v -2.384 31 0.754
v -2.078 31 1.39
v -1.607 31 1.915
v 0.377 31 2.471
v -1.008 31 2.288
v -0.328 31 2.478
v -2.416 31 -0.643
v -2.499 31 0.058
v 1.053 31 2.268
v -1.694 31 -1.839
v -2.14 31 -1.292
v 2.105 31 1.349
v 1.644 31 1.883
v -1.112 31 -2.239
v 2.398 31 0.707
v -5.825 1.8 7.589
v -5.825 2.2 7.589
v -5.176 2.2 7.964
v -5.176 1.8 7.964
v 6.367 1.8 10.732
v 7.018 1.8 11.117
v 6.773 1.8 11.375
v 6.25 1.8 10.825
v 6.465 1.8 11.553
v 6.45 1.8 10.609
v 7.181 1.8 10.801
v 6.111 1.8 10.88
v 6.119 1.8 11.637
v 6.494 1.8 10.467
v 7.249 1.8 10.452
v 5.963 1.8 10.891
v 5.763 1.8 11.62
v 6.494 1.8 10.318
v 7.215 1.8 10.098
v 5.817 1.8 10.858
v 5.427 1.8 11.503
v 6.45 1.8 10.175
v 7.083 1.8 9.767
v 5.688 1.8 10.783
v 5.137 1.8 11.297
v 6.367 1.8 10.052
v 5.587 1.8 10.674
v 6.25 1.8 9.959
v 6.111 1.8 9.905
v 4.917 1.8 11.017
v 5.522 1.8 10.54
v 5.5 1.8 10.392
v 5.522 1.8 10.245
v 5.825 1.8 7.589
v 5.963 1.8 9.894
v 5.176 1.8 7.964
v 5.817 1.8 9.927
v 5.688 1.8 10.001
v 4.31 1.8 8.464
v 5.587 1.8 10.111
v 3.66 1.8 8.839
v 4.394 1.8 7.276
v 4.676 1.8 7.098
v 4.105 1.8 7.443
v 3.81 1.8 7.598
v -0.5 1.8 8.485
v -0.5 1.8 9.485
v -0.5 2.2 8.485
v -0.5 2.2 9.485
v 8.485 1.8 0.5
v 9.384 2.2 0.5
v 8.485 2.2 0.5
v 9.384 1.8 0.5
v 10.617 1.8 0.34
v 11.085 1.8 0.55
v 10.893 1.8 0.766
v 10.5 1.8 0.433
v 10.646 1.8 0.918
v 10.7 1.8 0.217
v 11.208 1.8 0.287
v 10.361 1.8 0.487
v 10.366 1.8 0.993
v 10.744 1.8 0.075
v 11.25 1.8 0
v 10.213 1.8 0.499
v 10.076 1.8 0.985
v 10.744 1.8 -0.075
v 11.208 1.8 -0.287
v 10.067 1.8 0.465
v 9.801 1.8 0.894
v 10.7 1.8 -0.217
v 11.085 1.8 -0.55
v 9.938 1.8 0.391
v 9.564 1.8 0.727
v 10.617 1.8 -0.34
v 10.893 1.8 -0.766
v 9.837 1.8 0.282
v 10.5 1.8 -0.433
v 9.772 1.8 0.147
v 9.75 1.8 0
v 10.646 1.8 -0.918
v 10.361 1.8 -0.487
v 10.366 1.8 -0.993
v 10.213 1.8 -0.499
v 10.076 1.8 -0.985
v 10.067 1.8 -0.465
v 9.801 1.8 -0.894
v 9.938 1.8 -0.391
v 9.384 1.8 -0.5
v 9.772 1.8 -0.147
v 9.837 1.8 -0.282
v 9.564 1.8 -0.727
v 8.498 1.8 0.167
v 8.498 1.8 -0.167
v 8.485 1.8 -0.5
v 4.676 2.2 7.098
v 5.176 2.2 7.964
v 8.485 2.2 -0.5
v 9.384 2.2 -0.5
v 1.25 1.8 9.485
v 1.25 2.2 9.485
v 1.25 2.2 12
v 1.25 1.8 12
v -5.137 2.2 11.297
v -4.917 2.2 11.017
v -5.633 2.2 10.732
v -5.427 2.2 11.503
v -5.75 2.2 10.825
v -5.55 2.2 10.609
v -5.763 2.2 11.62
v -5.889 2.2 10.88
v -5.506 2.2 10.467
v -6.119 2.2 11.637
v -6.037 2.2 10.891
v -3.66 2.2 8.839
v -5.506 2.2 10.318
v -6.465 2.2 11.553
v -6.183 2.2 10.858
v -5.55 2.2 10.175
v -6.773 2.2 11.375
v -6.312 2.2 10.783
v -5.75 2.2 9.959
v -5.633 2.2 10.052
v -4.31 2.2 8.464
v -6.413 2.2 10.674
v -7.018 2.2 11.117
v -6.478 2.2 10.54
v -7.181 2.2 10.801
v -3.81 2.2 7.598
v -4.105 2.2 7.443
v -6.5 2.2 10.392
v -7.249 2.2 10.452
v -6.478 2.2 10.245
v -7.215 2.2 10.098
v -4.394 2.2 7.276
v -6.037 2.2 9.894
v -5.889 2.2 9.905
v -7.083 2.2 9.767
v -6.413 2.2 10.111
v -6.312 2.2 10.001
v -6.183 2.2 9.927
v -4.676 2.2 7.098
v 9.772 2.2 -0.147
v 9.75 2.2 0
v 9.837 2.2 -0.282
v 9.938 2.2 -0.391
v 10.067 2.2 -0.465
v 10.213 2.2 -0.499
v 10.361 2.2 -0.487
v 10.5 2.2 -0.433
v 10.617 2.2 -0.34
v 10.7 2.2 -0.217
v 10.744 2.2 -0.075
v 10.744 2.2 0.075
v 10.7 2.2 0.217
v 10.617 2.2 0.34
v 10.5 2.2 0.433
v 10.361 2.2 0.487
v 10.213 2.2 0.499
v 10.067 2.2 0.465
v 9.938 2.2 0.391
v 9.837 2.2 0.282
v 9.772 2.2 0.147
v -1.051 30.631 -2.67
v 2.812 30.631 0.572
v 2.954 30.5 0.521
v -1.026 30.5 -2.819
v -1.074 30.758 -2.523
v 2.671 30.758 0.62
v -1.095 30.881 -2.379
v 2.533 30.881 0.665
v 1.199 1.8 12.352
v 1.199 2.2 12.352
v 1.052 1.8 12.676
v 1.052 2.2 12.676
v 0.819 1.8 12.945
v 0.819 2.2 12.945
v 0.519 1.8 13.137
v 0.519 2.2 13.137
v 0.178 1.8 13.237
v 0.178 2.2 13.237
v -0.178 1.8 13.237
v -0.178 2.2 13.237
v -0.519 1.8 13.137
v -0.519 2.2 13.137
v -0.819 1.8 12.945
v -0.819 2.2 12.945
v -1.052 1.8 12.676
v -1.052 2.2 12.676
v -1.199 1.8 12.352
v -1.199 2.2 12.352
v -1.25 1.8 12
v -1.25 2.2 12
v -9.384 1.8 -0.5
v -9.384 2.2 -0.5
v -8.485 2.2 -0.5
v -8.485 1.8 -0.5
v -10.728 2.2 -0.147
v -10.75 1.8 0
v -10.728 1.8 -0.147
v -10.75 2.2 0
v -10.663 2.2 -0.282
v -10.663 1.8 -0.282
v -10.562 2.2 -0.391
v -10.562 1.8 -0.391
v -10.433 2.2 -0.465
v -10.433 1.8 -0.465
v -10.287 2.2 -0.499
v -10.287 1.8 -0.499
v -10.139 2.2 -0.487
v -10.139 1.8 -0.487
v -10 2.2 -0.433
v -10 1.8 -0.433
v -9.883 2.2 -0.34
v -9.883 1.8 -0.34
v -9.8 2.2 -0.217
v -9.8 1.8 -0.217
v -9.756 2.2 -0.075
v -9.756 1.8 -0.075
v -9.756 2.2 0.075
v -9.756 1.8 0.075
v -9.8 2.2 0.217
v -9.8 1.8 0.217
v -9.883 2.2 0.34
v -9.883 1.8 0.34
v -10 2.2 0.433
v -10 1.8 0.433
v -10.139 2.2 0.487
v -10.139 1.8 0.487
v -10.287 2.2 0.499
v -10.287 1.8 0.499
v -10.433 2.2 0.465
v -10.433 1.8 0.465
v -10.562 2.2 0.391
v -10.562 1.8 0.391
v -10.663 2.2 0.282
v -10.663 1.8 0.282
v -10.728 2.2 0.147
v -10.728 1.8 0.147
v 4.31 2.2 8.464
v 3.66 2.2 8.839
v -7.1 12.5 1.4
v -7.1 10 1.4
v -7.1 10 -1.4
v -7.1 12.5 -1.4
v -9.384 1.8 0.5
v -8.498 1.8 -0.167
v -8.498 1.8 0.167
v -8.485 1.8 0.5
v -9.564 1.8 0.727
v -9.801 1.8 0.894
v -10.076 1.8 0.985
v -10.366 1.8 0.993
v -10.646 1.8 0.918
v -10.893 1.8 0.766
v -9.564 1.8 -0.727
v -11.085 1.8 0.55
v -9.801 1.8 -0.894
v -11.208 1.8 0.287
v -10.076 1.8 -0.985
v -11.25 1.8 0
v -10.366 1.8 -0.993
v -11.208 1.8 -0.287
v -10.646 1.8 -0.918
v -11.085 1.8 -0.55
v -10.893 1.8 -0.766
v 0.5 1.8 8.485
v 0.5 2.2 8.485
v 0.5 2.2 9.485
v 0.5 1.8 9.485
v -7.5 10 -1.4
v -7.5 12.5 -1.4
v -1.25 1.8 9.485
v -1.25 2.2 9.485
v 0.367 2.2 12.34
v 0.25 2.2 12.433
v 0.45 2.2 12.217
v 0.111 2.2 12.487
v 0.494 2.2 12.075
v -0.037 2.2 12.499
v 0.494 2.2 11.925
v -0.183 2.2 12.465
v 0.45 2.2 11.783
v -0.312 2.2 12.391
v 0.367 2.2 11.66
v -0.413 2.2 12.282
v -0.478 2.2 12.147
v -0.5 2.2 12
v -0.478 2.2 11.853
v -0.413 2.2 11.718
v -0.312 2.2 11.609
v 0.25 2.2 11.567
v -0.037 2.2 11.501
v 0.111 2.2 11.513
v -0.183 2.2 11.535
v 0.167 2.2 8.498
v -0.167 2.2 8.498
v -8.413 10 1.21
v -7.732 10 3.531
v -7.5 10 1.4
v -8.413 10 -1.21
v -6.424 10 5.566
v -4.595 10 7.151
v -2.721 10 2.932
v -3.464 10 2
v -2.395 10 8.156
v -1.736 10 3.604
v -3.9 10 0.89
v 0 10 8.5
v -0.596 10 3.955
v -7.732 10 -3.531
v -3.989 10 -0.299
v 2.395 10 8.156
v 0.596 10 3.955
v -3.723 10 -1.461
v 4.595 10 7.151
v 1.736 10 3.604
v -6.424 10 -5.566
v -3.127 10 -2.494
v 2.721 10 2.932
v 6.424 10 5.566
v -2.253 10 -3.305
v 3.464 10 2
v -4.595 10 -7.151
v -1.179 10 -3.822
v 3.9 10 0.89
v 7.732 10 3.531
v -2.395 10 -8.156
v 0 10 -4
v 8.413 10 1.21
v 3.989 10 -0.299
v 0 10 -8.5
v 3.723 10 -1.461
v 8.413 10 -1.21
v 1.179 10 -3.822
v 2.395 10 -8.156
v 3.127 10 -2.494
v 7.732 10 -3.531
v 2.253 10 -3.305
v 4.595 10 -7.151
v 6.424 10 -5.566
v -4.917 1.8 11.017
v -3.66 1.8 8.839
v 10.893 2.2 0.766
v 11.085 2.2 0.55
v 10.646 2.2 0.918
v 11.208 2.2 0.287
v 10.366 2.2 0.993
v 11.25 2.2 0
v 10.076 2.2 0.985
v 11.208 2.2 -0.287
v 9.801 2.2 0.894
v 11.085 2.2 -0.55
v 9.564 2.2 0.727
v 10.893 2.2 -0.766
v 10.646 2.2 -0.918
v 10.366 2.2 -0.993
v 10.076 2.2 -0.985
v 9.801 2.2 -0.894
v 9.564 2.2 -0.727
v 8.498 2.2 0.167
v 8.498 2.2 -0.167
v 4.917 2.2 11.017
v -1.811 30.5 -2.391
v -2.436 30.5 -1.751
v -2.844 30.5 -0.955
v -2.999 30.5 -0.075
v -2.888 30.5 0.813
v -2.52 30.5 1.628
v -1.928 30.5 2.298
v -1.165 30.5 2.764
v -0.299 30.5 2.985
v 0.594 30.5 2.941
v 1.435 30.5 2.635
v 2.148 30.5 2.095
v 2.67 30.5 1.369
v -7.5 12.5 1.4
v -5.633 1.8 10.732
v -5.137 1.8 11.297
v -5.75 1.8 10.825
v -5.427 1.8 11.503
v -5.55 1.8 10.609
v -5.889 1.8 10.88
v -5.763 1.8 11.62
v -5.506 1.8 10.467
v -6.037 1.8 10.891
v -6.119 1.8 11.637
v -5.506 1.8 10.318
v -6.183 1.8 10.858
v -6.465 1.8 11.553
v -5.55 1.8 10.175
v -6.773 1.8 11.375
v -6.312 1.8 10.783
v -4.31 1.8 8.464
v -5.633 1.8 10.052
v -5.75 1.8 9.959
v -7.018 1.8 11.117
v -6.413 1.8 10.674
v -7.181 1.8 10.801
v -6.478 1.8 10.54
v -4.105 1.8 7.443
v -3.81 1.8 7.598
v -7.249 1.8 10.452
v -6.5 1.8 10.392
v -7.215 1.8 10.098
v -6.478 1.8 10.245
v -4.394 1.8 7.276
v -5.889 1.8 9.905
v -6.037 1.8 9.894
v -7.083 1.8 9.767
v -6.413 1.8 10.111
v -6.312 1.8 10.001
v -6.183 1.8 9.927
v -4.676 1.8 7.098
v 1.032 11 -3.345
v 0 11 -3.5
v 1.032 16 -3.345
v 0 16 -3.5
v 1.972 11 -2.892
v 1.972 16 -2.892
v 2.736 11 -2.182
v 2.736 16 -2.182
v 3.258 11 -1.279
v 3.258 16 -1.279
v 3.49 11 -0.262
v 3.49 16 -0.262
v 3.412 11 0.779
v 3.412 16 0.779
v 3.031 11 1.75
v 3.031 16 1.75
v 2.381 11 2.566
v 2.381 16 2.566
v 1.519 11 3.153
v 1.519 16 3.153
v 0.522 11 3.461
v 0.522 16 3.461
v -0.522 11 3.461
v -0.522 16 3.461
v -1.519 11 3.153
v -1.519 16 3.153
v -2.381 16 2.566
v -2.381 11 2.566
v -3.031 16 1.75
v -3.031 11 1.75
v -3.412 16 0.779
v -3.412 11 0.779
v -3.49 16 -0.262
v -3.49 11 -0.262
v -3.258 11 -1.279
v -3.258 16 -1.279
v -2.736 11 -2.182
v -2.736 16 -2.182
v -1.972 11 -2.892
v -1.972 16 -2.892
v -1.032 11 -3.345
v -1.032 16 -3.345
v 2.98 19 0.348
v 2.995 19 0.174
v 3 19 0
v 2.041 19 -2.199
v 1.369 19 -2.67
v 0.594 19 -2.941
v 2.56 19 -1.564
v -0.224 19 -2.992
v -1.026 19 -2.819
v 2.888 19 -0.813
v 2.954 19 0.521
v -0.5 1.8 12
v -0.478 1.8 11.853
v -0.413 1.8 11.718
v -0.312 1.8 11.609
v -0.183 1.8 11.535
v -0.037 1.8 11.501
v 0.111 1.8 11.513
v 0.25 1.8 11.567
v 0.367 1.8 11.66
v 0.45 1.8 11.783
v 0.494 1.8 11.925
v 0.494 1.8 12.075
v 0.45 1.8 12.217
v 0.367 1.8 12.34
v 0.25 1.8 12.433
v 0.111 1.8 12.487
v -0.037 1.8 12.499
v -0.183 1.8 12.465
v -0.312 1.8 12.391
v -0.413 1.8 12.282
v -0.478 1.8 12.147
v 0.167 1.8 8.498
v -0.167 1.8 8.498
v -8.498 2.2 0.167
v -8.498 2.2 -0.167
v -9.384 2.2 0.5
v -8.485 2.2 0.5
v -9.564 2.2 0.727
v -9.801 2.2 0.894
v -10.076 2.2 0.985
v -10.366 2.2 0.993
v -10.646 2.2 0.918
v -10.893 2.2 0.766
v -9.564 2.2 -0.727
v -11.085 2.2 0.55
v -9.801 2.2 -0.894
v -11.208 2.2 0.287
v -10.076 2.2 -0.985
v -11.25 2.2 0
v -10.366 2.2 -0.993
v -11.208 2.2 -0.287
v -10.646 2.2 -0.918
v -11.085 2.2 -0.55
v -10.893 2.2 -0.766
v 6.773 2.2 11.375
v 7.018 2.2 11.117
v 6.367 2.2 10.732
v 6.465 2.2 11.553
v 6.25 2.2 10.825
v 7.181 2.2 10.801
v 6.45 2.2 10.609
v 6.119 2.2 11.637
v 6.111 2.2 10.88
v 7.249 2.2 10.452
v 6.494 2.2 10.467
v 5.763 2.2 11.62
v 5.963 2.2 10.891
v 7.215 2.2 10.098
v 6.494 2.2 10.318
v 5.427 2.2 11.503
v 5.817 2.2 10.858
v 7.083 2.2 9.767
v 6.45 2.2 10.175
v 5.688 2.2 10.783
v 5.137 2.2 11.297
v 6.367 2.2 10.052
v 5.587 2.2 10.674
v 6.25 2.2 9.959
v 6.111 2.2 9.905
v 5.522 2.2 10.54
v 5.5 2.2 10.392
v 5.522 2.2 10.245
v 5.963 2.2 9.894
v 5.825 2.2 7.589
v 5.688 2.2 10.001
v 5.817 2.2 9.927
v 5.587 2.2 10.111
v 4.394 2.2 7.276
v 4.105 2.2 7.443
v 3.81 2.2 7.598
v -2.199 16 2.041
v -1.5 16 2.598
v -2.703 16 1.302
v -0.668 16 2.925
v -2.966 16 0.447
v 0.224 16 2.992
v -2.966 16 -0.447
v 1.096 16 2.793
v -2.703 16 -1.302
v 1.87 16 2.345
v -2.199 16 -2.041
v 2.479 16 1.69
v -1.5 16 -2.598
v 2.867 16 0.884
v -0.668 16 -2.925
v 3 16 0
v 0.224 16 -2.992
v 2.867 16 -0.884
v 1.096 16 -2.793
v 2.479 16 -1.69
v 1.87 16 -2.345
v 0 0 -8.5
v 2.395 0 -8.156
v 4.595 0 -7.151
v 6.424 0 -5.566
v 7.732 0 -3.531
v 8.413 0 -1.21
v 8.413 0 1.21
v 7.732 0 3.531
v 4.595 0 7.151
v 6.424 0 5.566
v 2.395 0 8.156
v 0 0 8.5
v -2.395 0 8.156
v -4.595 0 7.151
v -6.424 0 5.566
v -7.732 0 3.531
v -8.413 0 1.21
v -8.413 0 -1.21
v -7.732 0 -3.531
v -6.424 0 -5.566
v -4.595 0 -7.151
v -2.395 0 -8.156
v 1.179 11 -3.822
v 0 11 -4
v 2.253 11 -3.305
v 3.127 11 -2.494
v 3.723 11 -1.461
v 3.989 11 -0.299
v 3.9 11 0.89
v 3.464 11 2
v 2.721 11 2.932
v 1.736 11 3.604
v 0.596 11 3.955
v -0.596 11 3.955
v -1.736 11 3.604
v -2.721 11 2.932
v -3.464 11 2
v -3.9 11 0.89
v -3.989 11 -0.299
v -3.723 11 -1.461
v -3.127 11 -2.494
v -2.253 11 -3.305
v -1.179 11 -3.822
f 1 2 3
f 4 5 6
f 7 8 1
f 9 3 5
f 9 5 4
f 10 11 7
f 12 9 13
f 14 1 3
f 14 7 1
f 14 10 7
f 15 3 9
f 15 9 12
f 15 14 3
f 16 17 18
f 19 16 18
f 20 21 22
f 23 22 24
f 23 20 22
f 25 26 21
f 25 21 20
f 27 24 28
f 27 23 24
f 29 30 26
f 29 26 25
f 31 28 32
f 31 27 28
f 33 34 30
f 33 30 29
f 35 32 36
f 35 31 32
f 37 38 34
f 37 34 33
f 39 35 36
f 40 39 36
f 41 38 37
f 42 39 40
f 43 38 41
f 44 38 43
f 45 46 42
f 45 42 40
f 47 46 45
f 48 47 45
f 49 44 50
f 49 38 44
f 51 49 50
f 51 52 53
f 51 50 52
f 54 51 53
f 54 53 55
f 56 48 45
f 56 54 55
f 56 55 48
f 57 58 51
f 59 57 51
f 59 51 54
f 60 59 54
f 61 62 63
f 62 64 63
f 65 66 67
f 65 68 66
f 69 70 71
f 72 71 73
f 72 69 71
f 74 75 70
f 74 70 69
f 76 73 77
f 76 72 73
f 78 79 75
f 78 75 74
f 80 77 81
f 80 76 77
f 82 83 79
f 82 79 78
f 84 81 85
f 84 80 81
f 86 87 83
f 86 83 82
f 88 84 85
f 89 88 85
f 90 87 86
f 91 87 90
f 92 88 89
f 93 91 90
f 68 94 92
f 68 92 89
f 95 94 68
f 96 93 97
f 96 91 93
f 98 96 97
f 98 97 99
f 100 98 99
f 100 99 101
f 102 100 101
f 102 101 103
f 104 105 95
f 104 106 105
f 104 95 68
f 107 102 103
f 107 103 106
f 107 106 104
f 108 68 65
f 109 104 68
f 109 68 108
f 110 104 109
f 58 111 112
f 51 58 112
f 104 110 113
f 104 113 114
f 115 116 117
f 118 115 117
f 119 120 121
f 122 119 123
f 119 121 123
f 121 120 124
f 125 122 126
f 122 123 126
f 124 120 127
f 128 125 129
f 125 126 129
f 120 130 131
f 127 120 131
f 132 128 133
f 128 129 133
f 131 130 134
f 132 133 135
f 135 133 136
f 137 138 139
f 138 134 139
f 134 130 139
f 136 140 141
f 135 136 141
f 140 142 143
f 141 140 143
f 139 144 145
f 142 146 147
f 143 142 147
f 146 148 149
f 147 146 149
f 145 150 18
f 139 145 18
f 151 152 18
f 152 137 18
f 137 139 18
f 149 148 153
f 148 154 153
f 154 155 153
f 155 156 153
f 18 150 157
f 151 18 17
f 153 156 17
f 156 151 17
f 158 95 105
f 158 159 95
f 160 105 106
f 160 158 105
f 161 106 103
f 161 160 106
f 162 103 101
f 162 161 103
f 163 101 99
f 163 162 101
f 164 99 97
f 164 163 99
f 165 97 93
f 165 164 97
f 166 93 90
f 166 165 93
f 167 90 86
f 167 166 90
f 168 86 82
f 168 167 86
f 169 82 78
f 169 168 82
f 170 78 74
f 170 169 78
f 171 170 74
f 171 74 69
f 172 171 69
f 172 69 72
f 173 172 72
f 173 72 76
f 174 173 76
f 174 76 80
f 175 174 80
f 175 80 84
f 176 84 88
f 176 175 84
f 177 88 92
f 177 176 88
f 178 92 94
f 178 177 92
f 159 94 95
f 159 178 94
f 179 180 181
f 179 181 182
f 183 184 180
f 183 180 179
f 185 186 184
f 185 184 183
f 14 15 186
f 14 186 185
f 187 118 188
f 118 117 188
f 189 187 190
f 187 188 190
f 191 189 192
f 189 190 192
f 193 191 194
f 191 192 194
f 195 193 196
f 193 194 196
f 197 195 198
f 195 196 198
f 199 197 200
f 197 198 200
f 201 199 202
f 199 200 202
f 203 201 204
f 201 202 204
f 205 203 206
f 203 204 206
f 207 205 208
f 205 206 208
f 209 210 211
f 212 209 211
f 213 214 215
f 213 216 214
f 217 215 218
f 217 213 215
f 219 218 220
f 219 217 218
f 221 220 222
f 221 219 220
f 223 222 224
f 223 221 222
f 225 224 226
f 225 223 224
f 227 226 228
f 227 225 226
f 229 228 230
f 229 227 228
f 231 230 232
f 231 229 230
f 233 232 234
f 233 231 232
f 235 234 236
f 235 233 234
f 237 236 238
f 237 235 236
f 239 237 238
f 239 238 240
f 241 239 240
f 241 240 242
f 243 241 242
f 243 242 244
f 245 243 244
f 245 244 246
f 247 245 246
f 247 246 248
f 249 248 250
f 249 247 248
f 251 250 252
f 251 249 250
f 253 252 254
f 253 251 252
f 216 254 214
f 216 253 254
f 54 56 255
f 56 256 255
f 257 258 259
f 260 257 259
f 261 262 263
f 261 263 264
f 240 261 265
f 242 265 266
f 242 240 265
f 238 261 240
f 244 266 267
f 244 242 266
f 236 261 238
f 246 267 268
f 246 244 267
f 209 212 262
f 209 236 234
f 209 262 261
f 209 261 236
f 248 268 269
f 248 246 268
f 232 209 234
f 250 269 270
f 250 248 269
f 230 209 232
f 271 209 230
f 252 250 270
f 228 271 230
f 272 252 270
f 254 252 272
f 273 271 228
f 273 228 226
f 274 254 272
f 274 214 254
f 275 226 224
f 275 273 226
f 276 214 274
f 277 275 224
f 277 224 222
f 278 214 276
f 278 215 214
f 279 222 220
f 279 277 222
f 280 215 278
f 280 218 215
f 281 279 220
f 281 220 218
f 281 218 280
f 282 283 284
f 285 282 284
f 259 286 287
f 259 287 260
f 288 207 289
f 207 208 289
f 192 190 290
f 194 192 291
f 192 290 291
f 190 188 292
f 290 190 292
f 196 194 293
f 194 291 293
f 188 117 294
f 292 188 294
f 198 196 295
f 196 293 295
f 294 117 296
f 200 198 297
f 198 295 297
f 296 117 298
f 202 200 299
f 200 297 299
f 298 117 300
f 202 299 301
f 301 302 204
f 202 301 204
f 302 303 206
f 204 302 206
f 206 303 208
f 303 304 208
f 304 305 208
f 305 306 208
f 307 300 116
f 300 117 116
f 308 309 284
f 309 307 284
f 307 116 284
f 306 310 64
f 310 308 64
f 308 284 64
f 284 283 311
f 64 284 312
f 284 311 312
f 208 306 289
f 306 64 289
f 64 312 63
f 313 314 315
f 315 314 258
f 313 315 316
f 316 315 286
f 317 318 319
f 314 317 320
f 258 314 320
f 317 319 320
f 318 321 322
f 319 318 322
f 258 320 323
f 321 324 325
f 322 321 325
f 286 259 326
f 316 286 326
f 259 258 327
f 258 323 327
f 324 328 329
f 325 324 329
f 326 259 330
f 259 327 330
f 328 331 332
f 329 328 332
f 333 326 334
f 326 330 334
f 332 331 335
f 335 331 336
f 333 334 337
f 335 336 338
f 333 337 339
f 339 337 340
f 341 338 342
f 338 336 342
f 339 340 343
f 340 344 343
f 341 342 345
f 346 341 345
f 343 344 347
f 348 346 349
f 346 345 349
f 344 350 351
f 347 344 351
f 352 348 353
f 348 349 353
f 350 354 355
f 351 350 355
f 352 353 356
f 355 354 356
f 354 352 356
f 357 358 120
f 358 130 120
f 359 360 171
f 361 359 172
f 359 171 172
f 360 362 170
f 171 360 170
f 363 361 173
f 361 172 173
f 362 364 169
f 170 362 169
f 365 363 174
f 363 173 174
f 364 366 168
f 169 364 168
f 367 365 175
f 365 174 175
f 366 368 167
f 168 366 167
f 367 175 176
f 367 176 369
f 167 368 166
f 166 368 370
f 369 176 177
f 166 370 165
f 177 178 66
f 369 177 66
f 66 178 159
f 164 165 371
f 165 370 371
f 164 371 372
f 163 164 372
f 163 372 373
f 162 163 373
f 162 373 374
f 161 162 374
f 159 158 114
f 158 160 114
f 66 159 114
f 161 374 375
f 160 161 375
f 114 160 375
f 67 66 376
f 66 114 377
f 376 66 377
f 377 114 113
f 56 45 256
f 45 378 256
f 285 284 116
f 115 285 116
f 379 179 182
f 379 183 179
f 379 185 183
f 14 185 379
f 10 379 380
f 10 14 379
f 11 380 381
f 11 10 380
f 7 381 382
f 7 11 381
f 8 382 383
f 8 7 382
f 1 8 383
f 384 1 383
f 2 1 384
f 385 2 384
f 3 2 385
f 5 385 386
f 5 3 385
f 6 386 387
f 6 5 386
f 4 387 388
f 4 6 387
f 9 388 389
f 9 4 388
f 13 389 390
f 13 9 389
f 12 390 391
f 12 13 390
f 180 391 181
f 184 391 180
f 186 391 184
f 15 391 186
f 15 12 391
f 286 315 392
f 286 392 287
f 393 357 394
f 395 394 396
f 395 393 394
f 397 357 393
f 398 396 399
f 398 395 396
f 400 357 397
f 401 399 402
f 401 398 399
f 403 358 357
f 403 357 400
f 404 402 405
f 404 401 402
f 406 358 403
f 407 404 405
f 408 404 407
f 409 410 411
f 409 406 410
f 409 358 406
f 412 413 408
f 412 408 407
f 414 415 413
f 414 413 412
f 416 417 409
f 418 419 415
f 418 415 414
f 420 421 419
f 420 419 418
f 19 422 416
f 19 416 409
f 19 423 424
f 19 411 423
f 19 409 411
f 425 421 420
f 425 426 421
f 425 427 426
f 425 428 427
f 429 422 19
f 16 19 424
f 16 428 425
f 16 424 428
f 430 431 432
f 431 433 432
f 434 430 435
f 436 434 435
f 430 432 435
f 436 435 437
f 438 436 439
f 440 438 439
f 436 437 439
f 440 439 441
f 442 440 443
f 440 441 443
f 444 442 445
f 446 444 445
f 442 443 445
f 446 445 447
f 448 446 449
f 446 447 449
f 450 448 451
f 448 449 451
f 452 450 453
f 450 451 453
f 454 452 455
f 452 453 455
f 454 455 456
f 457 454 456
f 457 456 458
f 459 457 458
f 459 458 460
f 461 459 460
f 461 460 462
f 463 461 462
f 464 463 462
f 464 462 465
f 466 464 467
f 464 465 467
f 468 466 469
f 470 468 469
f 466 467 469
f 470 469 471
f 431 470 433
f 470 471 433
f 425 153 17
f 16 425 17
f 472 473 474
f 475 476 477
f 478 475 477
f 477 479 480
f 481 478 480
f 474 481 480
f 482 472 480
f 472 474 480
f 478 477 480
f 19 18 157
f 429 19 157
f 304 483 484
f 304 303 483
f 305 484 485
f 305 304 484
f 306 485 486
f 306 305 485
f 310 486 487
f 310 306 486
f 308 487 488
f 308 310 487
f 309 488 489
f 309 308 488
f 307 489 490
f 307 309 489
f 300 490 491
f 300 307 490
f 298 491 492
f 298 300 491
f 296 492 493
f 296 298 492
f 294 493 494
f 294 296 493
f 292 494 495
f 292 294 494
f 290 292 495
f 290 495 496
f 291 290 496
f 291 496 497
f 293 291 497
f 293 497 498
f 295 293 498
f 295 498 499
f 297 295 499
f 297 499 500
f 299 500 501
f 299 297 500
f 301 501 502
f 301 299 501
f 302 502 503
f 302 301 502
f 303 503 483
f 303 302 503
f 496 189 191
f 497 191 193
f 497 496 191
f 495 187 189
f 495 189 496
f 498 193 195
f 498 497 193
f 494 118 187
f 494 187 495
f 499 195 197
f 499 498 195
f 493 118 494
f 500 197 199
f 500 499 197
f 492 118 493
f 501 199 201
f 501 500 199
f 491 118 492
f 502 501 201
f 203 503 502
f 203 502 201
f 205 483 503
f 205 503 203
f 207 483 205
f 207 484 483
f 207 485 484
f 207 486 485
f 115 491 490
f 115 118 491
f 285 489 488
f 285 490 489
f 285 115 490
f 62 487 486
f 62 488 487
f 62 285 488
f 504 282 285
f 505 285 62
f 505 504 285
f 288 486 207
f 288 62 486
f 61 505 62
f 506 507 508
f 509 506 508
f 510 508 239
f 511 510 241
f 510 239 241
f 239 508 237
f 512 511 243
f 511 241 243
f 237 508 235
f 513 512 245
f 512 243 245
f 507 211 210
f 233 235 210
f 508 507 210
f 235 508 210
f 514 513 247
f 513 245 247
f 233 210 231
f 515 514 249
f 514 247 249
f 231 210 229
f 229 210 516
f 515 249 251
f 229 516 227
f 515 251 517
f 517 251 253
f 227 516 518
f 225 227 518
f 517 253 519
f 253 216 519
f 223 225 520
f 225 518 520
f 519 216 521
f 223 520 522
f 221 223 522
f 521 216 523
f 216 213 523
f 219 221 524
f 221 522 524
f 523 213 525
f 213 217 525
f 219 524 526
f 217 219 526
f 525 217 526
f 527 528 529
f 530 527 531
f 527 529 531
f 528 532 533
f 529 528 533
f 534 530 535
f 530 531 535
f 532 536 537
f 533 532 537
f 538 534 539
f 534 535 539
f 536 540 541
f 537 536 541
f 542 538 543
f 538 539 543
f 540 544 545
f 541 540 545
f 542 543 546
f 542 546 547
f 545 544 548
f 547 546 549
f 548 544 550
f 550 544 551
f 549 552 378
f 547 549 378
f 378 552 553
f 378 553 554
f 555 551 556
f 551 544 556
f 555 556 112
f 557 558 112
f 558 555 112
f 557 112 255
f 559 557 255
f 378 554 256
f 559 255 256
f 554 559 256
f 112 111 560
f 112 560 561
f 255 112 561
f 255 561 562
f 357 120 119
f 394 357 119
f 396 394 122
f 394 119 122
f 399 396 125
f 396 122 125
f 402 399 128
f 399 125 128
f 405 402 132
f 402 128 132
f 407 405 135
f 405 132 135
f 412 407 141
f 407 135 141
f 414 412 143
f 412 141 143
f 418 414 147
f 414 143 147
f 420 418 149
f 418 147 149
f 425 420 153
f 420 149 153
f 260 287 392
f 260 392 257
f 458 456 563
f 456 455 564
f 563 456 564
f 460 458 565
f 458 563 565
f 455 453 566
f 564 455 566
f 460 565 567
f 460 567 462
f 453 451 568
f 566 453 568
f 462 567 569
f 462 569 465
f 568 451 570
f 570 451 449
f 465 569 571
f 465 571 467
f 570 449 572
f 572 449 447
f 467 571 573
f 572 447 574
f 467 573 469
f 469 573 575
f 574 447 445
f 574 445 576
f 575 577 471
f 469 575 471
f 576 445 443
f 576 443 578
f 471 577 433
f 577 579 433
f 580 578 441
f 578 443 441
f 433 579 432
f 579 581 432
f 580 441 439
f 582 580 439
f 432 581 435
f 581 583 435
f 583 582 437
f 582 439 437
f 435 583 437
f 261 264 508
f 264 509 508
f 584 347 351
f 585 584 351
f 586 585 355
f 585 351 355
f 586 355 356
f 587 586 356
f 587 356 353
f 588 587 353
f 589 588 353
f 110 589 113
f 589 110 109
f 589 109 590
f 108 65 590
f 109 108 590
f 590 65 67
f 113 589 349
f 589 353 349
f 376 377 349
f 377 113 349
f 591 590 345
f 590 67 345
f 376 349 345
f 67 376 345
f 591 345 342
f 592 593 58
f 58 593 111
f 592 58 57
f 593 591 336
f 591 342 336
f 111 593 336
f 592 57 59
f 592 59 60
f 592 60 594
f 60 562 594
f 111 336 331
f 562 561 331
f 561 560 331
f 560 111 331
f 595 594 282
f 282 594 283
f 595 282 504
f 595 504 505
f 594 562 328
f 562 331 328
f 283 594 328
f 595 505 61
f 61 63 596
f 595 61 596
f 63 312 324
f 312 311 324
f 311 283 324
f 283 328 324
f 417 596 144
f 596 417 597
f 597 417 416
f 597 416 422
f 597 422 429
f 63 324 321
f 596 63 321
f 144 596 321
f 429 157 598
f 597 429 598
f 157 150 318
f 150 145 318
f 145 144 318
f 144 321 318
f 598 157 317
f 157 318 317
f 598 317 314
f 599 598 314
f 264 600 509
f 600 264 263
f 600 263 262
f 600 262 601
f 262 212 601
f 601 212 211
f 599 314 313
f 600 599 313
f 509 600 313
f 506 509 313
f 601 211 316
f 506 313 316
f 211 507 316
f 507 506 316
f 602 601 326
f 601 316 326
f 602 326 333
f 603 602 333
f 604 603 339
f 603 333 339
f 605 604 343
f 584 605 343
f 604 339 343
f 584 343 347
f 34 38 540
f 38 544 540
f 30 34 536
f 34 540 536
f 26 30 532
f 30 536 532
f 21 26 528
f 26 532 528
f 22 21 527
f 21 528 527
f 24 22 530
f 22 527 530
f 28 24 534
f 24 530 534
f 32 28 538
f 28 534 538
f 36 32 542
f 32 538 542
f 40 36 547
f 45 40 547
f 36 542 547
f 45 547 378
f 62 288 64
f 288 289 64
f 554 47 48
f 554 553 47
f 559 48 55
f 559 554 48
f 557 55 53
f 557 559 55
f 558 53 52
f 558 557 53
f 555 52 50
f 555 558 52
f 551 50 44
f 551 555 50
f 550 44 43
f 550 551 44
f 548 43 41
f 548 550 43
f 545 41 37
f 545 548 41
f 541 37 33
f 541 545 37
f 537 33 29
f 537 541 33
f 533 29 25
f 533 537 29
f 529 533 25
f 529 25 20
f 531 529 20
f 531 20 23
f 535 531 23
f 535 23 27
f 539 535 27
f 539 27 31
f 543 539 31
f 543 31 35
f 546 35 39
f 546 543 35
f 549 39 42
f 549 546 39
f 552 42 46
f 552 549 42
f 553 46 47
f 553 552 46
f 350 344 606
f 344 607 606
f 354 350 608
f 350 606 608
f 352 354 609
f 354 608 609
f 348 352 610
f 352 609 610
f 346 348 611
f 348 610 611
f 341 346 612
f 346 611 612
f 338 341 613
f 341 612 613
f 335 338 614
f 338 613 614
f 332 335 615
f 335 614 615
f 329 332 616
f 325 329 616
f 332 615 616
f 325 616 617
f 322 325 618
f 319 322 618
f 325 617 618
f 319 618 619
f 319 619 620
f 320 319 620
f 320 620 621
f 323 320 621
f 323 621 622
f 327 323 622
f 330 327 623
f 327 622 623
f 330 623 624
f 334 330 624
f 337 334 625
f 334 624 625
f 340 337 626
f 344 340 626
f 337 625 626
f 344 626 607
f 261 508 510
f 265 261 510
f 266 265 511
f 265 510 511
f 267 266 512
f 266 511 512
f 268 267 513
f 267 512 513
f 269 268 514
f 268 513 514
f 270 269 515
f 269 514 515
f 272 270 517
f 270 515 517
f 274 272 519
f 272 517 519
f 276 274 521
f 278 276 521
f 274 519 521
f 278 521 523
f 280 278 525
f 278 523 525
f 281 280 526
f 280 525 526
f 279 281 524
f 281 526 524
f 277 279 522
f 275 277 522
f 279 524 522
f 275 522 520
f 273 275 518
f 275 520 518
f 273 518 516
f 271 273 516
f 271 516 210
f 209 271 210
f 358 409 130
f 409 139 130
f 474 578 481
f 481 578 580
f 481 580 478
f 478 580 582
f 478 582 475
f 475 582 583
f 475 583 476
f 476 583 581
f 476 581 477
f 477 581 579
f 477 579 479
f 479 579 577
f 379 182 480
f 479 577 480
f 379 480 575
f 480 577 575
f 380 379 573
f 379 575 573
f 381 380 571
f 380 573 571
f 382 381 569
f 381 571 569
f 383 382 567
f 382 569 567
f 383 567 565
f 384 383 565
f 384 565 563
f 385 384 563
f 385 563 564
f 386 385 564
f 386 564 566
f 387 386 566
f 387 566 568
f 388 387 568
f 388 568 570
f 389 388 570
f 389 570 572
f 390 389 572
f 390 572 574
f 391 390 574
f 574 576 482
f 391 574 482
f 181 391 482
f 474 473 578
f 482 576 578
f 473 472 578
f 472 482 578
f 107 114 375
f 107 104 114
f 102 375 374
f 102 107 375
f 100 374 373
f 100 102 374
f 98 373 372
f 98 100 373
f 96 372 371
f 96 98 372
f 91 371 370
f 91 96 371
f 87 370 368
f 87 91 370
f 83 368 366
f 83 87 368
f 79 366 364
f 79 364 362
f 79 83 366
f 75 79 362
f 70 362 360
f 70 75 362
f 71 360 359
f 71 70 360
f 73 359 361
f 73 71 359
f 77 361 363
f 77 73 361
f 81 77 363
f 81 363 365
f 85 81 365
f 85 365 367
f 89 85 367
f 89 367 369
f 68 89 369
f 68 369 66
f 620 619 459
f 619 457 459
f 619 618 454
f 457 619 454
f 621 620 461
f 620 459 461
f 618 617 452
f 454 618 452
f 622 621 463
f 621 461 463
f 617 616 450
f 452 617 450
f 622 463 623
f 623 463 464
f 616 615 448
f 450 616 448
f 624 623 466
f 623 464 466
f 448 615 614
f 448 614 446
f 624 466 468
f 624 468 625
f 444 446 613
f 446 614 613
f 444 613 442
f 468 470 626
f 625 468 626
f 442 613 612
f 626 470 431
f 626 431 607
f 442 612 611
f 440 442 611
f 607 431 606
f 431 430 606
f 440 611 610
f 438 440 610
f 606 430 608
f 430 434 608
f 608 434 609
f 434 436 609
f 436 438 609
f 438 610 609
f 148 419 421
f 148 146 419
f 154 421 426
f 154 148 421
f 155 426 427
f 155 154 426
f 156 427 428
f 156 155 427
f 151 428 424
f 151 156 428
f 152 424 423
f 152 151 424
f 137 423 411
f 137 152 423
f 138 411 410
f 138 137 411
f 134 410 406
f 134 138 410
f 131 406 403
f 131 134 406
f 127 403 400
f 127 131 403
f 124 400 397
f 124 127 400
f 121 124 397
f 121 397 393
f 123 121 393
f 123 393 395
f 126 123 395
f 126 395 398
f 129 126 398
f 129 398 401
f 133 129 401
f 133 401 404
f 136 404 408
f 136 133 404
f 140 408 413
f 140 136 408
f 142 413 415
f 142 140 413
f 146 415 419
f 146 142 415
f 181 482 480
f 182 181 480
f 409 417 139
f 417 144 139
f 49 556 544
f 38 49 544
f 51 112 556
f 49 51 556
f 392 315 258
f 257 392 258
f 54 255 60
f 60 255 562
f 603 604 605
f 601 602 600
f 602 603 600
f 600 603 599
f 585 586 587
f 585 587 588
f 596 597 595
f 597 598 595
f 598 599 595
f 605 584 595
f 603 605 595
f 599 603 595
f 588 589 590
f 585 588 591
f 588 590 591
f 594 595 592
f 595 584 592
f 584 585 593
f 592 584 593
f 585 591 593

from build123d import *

# Parameters (mm, degrees)
SKETCH2_W           = 0.4
SKETCH2_H           = 2.8
BOSS_EXTRUDE1_DEPTH = 2.5
SKETCH3_R           = 0.5
BOSS_EXTRUDE2_DEPTH = 0.2
SKETCH4_R           = 3
BOSS_EXTRUDE4_DEPTH = 15
CUT_EXTRUDE1_DEPTH  = 12
CHAMFER1_SIZE       = 0.5


with BuildPart() as part:
    # Sketch1 → Revolve1 (revolve)
    with BuildSketch(Plane(origin=(0, 0, 0), x_dir=(0, 0, -1), z_dir=(1, 0, 0))):
        Polygon((0, 0), (8.5, 0), (8.5, 10), (4, 10), (4, 11), (3.5, 11), (3.5, 16), (0, 16), align=None)
    revolve(axis=Axis((0, 16, 0), (0, -1, 0)))

    # Sketch2 → Boss-Extrude1 (add)
    with BuildSketch(Plane(origin=(0, 10, 0), x_dir=(1, 0, 0), z_dir=(0, 1, 0))):
        with Locations((-7.3, 0)):
            Rectangle(SKETCH2_W, SKETCH2_H)
    extrude(amount=BOSS_EXTRUDE1_DEPTH)

    # Sketch3 → Boss-Extrude2 (add, symmetric)
    with BuildSketch(Plane(origin=(0, 2, 0), x_dir=(-1, 0, 0), z_dir=(0, -1, 0))):
        with BuildLine():
            Line((-1.25, -9.485281374), (-1.25, -12))
            ThreePointArc((-1.25, -12), (0, -13.25), (1.25, -12))
            Line((1.25, -12), (1.25, -9.485281374))
            Line((1.25, -9.485281374), (0.5, -9.485281374))
            Line((0.5, -9.485281374), (0.5, -8.485281374))
            ThreePointArc((0.5, -8.485281374), (0, -8.5), (-0.5, -8.485281374))
            Line((-0.5, -8.485281374), (-0.5, -9.485281374))
            Line((-0.5, -9.485281374), (-1.25, -9.485281374))
        make_face()
        with Locations((0, -12)):
            Circle(SKETCH3_R, mode=Mode.SUBTRACT)
        with BuildLine():
            Line((-5.825172442, -7.589494632), (-7.082531755, -9.767304845))
            ThreePointArc((-7.082531755, -9.767304845), (-6.625, -11.4748366), (-4.917468245, -11.017304845))
            Line((-4.917468245, -11.017304845), (-3.660108932, -8.839494632))
            Line((-3.660108932, -8.839494632), (-4.309627985, -8.464494632))
            Line((-4.309627985, -8.464494632), (-3.809627985, -7.598469228))
            ThreePointArc((-3.809627985, -7.598469228), (-4.25, -7.361215932), (-4.675653389, -7.098469228))
            Line((-4.675653389, -7.098469228), (-5.175653389, -7.964494632))
            Line((-5.175653389, -7.964494632), (-5.825172442, -7.589494632))
        make_face()
        with Locations((-6, -10.392304845)):
            Circle(SKETCH3_R, mode=Mode.SUBTRACT)
        with BuildLine():
            Line((5.175653389, -7.964494632), (4.675653389, -7.098469228))
            ThreePointArc((4.675653389, -7.098469228), (4.25, -7.361215932), (3.809627985, -7.598469228))
            Line((3.809627985, -7.598469228), (4.309627985, -8.464494632))
            Line((4.309627985, -8.464494632), (3.660108932, -8.839494632))
            Line((3.660108932, -8.839494632), (4.917468245, -11.017304845))
            ThreePointArc((4.917468245, -11.017304845), (6.625, -11.4748366), (7.082531755, -9.767304845))
            Line((7.082531755, -9.767304845), (5.825172442, -7.589494632))
            Line((5.825172442, -7.589494632), (5.175653389, -7.964494632))
        make_face()
        with Locations((6, -10.392304845)):
            Circle(SKETCH3_R, mode=Mode.SUBTRACT)
        with BuildLine():
            Line((9.383974596, 0.5), (8.485281374, 0.5))
            ThreePointArc((8.485281374, 0.5), (8.5, 0), (8.485281374, -0.5))
            Line((8.485281374, -0.5), (9.383974596, -0.5))
            ThreePointArc((9.383974596, -0.5), (11.25, 0), (9.383974596, 0.5))
        make_face()
        with Locations((10.25, 0)):
            Circle(SKETCH3_R, mode=Mode.SUBTRACT)
        with BuildLine():
            Line((-9.383974596, -0.5), (-8.485281374, -0.5))
            ThreePointArc((-8.485281374, -0.5), (-8.5, 0), (-8.485281374, 0.5))
            Line((-8.485281374, 0.5), (-9.383974596, 0.5))
            ThreePointArc((-9.383974596, 0.5), (-11.25, 0), (-9.383974596, -0.5))
        make_face()
        with Locations((-10.25, 0)):
            Circle(SKETCH3_R, mode=Mode.SUBTRACT)
    extrude(amount=BOSS_EXTRUDE2_DEPTH, both=True)

    # Sketch4 → Boss-Extrude4 (add)
    with BuildSketch(Plane(origin=(0, 16, 0), x_dir=(1, 0, 0), z_dir=(0, 1, 0))):
        Circle(SKETCH4_R)
    extrude(amount=BOSS_EXTRUDE4_DEPTH)

    # Sketch5 → Cut-Extrude1 (cut)
    with BuildSketch(Plane(origin=(0, 31, 0), x_dir=(1, 0, 0), z_dir=(0, 1, 0))):
        with BuildLine():
            Line((2.954423259, -0.520944533), (-1.02606043, 2.819077862))
            ThreePointArc((-1.02606043, 2.819077862), (1.928362829, 2.298133329), (2.954423259, -0.520944533))
        make_face()
    extrude(amount=-CUT_EXTRUDE1_DEPTH, mode=Mode.SUBTRACT)

    # Chamfer1
    chamfer1_edges = [part.edges().sort_by_distance(p)[0] for p in [
        (-1.928362829, 31, 2.298133329),
        (0.964181415, 31, -1.149066665),
    ]]
    chamfer(chamfer1_edges, length=CHAMFER1_SIZE)


solid = part.part
